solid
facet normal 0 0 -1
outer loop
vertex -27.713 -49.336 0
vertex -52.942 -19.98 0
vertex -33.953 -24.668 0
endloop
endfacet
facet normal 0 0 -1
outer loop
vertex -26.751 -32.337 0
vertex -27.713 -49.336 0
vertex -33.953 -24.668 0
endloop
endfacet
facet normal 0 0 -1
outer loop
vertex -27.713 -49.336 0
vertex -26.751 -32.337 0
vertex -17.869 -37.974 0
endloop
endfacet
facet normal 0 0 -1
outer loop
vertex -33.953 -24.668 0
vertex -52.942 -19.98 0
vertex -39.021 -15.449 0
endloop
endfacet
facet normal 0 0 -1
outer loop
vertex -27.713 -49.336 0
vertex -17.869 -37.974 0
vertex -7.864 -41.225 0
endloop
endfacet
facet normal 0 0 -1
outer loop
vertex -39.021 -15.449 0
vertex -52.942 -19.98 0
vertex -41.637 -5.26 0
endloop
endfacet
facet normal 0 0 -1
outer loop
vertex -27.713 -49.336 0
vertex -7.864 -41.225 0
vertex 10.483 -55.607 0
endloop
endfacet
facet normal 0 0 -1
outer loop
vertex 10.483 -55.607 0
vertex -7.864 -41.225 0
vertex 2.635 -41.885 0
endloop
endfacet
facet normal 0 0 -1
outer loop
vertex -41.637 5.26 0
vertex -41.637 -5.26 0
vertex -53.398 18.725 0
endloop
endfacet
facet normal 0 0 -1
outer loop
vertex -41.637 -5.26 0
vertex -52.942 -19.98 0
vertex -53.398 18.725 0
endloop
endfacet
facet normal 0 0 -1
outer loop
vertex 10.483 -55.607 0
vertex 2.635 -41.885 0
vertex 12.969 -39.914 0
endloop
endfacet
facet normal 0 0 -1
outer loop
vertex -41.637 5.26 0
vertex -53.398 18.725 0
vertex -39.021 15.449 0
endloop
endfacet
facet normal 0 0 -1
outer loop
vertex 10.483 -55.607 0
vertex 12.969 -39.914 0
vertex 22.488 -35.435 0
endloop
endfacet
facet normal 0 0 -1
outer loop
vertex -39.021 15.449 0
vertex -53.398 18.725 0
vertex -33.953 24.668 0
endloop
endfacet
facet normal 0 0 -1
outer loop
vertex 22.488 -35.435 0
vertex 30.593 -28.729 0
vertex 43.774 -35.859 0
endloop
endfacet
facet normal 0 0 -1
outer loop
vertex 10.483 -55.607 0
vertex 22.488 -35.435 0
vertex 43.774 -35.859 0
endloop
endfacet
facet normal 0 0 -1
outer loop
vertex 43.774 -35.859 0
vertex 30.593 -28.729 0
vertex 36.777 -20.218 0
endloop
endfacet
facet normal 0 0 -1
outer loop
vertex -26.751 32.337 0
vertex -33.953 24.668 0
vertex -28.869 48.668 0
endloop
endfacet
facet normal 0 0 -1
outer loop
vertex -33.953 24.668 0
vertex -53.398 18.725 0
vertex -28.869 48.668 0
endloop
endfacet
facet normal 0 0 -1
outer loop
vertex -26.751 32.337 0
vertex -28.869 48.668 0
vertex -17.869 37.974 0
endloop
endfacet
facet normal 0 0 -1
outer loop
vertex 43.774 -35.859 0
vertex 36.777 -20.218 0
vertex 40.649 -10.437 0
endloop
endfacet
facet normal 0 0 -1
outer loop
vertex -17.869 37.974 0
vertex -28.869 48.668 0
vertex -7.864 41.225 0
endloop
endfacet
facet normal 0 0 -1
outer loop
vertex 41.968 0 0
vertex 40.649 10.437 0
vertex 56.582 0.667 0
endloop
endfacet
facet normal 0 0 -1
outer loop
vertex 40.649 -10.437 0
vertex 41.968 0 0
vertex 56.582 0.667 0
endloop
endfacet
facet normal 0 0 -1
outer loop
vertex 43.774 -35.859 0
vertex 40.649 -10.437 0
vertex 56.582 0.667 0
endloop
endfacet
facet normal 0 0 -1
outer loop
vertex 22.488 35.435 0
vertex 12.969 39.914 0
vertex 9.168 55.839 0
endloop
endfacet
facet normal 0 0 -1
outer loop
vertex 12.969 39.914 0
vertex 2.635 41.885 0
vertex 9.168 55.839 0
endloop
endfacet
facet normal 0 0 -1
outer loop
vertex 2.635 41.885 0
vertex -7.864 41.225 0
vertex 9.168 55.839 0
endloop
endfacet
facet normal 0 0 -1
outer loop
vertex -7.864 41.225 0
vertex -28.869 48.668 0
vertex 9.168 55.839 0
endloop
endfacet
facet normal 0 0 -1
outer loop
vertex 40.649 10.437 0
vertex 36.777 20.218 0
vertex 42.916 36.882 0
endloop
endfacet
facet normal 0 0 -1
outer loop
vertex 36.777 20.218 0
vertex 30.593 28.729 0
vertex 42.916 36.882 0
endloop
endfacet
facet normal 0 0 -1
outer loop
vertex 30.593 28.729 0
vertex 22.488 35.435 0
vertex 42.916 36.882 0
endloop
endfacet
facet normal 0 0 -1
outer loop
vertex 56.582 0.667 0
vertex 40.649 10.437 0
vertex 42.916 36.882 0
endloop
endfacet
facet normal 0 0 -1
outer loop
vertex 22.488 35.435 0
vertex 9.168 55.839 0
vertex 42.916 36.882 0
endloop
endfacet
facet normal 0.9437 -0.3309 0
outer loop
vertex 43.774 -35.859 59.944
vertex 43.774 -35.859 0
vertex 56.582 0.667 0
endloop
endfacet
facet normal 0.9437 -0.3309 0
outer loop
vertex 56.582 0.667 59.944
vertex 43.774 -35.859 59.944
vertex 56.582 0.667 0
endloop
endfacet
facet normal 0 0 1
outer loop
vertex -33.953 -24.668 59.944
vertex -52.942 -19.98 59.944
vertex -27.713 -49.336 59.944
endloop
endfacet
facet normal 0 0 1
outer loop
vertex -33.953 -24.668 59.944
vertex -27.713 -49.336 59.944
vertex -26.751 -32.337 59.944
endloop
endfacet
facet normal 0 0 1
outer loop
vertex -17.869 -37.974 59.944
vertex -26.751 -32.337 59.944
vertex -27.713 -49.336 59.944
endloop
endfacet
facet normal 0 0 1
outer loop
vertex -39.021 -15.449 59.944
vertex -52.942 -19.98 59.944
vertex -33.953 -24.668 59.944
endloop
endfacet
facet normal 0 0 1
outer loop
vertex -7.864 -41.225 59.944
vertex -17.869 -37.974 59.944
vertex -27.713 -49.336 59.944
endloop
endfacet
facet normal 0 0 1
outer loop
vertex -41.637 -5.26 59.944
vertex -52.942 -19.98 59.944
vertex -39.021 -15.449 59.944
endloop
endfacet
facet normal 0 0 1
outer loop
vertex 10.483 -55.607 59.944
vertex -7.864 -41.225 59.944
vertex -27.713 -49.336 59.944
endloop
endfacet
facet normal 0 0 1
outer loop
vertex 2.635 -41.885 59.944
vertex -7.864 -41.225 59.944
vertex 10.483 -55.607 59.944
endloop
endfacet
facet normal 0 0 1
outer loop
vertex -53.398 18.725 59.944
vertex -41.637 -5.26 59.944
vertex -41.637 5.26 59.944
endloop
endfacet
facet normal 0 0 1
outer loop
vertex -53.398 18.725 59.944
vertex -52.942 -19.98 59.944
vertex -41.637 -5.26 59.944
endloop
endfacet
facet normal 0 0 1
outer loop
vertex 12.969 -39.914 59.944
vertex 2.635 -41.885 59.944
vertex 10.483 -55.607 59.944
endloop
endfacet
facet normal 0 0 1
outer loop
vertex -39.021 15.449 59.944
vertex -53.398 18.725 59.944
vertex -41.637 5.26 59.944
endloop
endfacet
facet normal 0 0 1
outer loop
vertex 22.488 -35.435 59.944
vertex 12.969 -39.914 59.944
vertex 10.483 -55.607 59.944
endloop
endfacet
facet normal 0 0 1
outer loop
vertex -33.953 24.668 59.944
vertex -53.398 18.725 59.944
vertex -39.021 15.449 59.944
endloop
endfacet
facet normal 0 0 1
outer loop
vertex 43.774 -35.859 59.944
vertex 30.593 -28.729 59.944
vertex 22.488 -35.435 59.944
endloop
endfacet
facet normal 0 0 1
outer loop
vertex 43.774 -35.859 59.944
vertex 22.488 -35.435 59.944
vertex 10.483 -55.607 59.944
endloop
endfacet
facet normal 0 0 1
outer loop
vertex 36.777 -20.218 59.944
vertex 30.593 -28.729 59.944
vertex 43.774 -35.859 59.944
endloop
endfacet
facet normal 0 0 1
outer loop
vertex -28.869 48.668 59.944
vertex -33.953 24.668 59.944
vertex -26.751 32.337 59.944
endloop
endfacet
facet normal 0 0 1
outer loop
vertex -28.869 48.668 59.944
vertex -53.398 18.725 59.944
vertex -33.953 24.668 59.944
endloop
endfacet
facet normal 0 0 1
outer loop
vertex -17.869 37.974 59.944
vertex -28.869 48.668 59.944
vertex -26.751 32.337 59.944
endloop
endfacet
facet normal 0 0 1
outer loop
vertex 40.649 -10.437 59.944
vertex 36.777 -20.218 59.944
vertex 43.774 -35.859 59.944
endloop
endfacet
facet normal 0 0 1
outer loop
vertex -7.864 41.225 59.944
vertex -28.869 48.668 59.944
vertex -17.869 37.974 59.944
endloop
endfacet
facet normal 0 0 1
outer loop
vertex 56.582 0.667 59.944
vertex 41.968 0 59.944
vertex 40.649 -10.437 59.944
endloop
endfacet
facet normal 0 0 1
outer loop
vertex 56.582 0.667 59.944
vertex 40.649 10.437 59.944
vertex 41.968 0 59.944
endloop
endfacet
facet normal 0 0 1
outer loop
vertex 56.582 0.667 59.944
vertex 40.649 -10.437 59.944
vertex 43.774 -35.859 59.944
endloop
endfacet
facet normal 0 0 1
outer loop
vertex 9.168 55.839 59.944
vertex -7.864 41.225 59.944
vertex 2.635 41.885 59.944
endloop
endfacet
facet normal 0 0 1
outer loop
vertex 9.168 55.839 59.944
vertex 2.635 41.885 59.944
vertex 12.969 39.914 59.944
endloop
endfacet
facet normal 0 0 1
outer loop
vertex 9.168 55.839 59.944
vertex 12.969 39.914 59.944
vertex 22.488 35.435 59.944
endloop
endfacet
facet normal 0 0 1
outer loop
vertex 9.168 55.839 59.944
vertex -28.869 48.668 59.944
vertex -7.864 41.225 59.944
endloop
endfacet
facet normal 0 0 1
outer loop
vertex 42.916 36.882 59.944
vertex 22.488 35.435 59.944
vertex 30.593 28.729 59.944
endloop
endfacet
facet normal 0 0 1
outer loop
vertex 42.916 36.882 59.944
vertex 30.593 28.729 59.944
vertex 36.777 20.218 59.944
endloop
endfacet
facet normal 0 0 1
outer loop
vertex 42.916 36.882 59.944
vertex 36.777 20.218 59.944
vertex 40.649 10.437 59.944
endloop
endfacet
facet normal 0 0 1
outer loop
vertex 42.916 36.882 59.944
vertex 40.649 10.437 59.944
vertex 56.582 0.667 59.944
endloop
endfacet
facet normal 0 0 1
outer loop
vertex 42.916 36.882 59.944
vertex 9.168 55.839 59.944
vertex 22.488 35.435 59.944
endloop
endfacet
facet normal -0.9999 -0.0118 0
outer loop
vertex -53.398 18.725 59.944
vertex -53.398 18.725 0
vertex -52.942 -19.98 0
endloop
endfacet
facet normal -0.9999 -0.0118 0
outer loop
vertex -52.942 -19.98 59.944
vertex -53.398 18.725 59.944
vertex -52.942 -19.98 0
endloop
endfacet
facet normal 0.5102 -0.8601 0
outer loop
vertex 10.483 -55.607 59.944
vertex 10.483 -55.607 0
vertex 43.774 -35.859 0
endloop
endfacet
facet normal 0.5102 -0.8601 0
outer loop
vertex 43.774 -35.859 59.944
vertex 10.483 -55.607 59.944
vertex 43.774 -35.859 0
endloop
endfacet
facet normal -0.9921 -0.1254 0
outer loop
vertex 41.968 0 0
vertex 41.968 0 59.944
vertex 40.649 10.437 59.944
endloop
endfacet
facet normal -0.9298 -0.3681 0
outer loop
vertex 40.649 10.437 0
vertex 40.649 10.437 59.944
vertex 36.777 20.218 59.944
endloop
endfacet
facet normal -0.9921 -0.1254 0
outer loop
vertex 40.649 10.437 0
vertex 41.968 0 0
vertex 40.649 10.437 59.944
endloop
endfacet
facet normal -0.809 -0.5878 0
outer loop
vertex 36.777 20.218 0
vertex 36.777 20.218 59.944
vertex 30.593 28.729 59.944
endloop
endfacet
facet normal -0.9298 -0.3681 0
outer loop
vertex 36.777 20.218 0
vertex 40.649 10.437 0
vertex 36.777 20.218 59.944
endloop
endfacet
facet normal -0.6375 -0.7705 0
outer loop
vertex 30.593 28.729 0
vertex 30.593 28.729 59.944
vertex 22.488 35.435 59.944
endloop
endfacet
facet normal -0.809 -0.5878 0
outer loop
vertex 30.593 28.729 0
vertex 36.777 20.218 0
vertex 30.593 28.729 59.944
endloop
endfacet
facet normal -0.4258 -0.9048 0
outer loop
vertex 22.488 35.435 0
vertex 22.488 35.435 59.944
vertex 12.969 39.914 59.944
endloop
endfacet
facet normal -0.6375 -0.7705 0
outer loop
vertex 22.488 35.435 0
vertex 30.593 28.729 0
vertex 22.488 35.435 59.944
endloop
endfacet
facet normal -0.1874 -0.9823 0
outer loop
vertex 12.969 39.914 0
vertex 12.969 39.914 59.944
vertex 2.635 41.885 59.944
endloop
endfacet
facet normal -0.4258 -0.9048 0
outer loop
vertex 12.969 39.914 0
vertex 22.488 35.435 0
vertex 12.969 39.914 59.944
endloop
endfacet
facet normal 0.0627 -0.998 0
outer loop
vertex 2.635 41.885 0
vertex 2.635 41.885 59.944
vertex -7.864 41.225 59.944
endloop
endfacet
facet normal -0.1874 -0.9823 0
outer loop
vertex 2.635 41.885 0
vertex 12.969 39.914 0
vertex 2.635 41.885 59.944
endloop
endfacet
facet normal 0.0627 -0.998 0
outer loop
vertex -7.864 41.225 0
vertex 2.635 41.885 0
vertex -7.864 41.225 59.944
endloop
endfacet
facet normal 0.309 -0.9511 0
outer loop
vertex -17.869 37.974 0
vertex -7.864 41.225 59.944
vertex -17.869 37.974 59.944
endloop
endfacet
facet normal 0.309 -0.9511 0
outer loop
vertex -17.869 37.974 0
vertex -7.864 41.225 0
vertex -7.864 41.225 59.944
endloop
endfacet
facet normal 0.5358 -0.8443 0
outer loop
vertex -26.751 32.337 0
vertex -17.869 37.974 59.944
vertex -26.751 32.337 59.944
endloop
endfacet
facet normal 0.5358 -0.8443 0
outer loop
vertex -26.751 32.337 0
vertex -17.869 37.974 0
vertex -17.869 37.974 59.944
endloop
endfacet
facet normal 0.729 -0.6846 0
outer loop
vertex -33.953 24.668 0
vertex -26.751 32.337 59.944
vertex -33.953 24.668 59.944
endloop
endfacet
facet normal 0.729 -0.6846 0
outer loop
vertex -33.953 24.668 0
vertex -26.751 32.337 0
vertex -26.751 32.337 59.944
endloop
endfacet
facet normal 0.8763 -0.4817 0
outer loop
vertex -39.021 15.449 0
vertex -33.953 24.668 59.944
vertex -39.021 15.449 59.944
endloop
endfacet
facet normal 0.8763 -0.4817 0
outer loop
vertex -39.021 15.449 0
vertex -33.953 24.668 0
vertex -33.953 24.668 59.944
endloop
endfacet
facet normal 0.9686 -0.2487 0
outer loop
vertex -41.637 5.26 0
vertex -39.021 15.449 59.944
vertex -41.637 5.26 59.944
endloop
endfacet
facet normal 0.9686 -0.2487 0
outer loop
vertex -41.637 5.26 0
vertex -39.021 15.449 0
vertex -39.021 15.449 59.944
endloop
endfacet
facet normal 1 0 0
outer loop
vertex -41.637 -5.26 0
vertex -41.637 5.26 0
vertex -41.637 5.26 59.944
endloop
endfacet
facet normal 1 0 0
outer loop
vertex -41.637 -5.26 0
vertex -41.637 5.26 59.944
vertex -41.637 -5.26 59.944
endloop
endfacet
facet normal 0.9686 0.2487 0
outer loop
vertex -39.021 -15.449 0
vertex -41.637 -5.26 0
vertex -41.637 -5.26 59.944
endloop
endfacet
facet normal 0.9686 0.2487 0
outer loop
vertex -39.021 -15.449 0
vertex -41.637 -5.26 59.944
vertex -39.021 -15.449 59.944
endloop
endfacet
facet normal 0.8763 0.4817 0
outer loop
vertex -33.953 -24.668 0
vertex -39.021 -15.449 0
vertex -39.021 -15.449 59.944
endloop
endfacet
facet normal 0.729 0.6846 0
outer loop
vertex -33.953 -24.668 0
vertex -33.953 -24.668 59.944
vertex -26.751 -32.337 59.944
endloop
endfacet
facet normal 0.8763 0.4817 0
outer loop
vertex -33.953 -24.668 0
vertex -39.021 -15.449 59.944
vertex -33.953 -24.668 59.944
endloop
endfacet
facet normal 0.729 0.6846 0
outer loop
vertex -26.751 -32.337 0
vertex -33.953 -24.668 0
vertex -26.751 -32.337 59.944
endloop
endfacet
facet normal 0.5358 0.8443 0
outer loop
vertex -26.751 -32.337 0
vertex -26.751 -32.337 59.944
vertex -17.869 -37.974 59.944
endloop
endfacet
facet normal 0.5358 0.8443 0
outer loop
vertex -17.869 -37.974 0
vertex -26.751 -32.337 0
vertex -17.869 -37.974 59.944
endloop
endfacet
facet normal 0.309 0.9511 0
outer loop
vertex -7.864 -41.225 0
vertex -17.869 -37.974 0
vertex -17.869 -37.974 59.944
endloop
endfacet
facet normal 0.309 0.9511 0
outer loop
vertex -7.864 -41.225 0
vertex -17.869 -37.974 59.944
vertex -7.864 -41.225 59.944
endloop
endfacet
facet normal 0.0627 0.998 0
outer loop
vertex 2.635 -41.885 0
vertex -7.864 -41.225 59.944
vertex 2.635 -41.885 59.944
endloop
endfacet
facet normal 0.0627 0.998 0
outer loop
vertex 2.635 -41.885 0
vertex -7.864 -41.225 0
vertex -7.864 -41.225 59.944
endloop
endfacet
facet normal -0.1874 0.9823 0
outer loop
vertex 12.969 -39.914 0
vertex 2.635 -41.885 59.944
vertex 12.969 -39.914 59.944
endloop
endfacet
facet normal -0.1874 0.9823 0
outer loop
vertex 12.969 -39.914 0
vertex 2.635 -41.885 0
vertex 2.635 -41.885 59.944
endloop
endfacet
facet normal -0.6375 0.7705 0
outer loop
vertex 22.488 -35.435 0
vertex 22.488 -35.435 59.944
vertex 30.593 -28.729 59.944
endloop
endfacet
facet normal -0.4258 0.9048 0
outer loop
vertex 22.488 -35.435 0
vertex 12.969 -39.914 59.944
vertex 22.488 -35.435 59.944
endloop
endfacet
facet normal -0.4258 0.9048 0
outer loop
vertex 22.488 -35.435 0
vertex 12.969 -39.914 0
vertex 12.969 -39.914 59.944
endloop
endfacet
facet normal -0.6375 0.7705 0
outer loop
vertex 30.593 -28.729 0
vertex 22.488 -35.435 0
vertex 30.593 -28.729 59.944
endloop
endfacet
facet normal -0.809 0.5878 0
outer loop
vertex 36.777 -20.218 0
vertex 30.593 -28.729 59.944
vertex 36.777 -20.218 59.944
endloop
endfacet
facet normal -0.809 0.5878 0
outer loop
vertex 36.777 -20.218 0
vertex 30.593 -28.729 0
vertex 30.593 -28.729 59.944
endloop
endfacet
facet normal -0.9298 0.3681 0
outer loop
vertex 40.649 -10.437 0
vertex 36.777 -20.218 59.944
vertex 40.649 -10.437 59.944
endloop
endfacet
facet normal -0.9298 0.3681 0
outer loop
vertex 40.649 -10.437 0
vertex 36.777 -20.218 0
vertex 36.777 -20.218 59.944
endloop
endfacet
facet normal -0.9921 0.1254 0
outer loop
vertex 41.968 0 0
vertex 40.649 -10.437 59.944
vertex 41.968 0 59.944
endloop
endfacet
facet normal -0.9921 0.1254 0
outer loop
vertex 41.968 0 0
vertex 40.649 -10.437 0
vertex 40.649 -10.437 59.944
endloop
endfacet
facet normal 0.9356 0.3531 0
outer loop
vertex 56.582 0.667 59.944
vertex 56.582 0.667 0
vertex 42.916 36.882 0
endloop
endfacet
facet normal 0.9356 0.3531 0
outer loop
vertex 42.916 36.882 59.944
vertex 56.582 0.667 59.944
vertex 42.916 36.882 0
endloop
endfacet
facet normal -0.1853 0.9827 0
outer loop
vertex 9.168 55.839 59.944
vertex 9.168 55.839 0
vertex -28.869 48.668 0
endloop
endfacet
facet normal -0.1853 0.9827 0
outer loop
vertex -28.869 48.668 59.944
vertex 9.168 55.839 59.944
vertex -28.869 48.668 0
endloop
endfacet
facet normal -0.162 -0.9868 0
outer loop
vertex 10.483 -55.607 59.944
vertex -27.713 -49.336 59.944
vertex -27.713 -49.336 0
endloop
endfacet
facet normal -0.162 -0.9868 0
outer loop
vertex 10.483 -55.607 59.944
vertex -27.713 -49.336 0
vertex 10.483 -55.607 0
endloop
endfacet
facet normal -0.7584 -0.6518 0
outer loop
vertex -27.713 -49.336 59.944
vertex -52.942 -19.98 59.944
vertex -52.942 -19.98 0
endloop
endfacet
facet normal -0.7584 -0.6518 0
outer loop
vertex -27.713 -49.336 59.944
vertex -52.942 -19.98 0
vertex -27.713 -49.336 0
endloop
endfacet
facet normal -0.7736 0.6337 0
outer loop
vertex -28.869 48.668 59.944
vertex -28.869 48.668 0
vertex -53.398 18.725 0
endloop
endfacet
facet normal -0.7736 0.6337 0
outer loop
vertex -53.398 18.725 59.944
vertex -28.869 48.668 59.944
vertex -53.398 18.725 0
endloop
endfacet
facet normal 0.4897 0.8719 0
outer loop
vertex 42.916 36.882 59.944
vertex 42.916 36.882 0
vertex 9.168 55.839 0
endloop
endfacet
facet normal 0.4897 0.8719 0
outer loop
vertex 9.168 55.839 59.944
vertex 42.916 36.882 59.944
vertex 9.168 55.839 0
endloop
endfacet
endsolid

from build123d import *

# Parameters (mm, degrees)
F1_DEPTH = 59.944
F2_R     = 41.967916
F3_DEPTH = 83.566


with BuildPart() as f1:
    # F0 (on Top) → F1 (new body)
    with BuildSketch(Plane.XY):
        Polygon((10.482761, -55.606968), (43.773731, -35.85922), (56.582486, 0.667455), (42.915667, 36.881821), (9.16813, 55.838773), (-28.869276, 48.668142), (-53.398427, 18.725147), (-52.941861, -19.979553), (-27.71321, -49.335598), align=None)
    extrude(amount=F1_DEPTH)

    # F2 (on Top) → F3 (cut)
    with BuildSketch(Plane.XY):
        Circle(F2_R)
    extrude(amount=F3_DEPTH, mode=Mode.SUBTRACT)


solid = f1.part
